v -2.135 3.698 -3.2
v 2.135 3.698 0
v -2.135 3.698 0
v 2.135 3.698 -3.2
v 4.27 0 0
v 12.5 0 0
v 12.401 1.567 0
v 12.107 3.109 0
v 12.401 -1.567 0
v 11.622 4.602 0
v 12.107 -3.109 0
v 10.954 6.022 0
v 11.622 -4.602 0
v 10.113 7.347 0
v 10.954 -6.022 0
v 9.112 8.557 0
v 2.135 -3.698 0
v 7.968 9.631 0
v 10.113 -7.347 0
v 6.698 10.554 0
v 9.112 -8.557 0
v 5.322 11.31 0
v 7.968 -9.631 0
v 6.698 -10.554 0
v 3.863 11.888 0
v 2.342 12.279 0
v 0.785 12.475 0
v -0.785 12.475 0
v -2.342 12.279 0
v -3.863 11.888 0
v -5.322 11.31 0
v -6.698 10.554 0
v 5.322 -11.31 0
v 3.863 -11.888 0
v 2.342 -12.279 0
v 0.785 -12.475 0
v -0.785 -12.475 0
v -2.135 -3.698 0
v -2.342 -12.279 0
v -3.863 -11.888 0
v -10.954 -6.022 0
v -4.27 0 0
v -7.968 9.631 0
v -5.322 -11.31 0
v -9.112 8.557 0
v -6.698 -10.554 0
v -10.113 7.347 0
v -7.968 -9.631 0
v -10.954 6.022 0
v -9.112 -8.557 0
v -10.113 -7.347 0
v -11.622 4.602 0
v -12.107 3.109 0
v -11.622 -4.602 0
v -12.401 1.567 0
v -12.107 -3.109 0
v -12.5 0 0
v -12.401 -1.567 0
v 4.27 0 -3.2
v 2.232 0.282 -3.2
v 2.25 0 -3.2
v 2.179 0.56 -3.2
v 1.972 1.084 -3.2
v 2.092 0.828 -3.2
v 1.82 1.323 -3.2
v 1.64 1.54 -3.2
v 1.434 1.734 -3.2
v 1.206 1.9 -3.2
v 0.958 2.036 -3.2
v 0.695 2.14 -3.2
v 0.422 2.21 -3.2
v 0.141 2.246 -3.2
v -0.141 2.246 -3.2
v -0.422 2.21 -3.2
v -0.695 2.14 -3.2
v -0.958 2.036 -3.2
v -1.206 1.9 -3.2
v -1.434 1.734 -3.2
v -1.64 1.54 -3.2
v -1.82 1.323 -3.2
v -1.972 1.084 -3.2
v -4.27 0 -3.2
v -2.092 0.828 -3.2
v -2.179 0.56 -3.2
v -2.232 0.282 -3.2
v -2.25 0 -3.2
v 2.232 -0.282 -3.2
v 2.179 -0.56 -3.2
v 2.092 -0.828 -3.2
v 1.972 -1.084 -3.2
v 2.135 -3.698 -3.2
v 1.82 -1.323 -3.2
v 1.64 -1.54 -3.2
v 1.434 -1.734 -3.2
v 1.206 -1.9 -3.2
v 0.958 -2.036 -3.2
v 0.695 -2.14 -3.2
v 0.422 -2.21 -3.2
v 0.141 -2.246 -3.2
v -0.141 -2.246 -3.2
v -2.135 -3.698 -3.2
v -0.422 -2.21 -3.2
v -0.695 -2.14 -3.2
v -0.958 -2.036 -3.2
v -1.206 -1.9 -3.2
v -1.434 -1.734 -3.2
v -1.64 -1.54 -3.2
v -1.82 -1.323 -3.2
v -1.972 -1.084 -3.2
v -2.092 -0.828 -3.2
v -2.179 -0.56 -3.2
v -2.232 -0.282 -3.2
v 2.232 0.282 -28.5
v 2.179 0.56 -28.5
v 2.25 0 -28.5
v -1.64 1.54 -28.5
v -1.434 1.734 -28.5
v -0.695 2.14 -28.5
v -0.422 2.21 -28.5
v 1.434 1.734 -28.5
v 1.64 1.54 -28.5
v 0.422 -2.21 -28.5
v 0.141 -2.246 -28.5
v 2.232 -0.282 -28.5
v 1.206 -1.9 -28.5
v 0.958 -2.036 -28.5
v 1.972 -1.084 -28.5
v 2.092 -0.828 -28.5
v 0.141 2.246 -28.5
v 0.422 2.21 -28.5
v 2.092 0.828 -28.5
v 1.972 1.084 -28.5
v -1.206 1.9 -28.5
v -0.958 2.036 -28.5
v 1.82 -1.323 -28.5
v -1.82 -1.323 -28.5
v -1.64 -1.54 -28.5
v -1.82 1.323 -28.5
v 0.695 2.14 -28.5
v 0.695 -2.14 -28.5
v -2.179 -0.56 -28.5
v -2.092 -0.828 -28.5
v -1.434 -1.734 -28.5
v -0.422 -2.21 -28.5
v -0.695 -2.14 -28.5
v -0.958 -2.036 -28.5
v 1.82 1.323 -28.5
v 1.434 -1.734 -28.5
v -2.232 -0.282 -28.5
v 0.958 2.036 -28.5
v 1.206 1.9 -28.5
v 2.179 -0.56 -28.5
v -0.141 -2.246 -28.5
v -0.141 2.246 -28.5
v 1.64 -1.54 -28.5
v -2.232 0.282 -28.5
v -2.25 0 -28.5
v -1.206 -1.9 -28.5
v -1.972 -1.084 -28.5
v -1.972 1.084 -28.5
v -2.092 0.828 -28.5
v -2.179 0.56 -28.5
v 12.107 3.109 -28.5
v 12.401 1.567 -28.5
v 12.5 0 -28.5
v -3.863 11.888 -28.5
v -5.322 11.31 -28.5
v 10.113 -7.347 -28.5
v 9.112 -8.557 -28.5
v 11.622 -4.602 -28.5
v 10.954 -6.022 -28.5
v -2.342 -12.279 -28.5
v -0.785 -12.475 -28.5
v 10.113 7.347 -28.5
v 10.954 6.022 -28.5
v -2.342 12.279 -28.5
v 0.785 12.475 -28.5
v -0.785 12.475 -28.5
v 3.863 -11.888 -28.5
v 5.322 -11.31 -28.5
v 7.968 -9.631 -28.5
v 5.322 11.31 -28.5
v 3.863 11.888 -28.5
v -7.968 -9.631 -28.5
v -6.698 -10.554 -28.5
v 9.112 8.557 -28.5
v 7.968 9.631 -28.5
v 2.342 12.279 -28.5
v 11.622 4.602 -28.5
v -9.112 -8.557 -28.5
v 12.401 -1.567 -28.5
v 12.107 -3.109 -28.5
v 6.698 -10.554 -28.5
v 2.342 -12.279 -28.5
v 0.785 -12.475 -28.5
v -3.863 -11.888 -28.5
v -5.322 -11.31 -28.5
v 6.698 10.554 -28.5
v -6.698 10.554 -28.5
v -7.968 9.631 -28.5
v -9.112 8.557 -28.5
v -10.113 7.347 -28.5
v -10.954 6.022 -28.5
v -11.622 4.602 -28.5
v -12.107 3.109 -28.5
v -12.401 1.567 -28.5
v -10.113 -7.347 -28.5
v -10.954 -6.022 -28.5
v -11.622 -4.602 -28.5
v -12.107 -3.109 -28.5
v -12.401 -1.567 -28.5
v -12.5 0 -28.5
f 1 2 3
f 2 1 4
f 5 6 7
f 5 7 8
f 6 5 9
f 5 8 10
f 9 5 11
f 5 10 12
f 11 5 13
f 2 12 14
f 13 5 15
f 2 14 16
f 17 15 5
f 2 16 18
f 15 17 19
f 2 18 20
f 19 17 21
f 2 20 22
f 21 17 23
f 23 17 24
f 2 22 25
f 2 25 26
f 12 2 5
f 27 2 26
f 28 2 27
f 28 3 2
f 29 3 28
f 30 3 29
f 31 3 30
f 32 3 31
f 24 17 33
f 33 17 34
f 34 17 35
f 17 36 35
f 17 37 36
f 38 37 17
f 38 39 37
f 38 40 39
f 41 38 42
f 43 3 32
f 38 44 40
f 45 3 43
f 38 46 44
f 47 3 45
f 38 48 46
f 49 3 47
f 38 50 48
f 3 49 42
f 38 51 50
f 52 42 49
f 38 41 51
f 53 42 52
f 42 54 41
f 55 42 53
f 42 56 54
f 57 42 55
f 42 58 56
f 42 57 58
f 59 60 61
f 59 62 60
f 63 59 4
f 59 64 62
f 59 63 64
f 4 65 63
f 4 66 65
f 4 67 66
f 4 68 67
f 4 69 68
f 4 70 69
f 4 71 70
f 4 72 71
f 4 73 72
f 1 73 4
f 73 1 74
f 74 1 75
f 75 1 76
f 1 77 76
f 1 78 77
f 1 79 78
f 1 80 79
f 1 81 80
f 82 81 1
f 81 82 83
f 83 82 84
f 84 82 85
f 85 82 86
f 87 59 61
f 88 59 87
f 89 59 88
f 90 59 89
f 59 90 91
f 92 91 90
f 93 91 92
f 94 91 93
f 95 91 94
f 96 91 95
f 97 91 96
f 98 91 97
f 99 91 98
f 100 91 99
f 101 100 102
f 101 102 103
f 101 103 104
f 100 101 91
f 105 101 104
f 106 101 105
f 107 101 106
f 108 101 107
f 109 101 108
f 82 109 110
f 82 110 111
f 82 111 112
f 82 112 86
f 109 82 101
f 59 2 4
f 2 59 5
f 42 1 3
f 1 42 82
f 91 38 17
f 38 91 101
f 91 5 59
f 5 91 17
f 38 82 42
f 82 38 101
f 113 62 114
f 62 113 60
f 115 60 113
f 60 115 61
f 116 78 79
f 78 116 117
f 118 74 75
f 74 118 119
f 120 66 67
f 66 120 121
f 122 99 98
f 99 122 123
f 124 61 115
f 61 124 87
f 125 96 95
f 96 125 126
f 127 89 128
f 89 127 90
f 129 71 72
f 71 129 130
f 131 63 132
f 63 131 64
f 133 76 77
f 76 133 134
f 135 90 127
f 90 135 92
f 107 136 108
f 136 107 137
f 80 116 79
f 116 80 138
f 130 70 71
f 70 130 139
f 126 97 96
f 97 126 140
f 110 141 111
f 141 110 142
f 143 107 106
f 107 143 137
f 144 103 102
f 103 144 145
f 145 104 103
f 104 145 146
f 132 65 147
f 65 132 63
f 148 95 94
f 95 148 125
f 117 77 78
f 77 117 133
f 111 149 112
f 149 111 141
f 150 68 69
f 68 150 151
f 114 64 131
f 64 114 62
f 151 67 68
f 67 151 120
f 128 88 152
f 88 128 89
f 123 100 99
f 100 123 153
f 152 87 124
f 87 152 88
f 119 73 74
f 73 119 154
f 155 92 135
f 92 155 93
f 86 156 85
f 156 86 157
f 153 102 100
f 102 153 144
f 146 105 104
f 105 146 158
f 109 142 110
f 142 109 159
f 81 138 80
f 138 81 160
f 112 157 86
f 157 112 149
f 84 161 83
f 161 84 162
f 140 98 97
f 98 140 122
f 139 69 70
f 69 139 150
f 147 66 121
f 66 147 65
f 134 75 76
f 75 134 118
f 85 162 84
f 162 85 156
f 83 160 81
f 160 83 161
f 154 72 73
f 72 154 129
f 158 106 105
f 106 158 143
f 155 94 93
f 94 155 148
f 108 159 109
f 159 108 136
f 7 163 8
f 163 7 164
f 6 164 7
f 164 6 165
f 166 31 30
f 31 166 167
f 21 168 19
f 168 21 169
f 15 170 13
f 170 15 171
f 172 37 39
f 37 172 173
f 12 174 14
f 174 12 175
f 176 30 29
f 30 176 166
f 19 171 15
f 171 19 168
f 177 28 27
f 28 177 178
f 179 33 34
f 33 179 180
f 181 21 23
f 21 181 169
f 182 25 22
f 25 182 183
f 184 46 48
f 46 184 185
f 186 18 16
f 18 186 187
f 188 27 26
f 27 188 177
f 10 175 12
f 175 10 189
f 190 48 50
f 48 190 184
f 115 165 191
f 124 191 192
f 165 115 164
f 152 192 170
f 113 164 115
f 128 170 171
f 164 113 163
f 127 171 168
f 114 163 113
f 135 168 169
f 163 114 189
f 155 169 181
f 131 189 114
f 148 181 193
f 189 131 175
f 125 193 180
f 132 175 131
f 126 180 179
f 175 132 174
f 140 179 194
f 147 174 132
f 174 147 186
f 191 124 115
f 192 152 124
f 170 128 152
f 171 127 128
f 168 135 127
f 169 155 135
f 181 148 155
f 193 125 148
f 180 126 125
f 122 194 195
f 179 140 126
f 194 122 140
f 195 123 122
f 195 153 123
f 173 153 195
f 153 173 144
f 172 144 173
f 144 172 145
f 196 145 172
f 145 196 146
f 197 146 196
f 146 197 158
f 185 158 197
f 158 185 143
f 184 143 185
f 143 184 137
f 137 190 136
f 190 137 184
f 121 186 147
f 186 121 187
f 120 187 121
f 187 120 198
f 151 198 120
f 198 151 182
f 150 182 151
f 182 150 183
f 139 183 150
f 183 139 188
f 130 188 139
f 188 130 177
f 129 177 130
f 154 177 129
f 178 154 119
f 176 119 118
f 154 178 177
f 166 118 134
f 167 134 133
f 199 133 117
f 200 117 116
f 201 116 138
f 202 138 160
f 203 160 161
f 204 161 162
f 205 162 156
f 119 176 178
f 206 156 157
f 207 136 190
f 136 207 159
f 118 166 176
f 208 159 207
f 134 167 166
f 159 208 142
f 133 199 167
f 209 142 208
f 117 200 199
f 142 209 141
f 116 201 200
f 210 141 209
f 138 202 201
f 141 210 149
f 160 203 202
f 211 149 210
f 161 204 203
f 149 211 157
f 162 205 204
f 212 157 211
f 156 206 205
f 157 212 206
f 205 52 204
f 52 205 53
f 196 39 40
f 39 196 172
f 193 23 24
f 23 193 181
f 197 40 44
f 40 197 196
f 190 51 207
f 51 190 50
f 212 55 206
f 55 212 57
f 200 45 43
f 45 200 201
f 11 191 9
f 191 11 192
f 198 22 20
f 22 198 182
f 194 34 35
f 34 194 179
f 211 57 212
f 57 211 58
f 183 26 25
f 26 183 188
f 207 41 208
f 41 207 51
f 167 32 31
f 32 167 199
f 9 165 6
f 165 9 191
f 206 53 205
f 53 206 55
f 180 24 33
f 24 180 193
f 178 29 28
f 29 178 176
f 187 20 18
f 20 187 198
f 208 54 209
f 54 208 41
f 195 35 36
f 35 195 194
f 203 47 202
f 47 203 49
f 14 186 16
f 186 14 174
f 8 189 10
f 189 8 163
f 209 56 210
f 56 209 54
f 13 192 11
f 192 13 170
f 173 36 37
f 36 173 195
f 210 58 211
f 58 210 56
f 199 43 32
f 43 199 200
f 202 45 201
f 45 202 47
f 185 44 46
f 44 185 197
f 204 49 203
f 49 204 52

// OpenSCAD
$fn = 50;


difference() {
	union() {
		translate(v = [0, 0, -28.5000000000]) {
			cylinder(h = 28.5000000000, r = 12.5000000000);
		}
	}
	union() {
		translate(v = [0, 0, 0]) {
			rotate(a = [0, 0, 0]) {
				difference() {
					union() {
						translate(v = [0, 0, -3.2000000000]) {
							linear_extrude(height = 3.2000000000) {
								polygon(points = [[4.2698000000, 0.0000000000], [2.1349000000, 3.6977552691], [-2.1349000000, 3.6977552691], [-4.2698000000, 0.0000000000], [-2.1349000000, -3.6977552691], [2.1349000000, -3.6977552691]]);
							}
						}
					}
					union();
				}
			}
		}
		#translate(v = [0, 0, -100.0000000000]) {
			cylinder(h = 200, r = 2.2500000000);
		}
	}
}
